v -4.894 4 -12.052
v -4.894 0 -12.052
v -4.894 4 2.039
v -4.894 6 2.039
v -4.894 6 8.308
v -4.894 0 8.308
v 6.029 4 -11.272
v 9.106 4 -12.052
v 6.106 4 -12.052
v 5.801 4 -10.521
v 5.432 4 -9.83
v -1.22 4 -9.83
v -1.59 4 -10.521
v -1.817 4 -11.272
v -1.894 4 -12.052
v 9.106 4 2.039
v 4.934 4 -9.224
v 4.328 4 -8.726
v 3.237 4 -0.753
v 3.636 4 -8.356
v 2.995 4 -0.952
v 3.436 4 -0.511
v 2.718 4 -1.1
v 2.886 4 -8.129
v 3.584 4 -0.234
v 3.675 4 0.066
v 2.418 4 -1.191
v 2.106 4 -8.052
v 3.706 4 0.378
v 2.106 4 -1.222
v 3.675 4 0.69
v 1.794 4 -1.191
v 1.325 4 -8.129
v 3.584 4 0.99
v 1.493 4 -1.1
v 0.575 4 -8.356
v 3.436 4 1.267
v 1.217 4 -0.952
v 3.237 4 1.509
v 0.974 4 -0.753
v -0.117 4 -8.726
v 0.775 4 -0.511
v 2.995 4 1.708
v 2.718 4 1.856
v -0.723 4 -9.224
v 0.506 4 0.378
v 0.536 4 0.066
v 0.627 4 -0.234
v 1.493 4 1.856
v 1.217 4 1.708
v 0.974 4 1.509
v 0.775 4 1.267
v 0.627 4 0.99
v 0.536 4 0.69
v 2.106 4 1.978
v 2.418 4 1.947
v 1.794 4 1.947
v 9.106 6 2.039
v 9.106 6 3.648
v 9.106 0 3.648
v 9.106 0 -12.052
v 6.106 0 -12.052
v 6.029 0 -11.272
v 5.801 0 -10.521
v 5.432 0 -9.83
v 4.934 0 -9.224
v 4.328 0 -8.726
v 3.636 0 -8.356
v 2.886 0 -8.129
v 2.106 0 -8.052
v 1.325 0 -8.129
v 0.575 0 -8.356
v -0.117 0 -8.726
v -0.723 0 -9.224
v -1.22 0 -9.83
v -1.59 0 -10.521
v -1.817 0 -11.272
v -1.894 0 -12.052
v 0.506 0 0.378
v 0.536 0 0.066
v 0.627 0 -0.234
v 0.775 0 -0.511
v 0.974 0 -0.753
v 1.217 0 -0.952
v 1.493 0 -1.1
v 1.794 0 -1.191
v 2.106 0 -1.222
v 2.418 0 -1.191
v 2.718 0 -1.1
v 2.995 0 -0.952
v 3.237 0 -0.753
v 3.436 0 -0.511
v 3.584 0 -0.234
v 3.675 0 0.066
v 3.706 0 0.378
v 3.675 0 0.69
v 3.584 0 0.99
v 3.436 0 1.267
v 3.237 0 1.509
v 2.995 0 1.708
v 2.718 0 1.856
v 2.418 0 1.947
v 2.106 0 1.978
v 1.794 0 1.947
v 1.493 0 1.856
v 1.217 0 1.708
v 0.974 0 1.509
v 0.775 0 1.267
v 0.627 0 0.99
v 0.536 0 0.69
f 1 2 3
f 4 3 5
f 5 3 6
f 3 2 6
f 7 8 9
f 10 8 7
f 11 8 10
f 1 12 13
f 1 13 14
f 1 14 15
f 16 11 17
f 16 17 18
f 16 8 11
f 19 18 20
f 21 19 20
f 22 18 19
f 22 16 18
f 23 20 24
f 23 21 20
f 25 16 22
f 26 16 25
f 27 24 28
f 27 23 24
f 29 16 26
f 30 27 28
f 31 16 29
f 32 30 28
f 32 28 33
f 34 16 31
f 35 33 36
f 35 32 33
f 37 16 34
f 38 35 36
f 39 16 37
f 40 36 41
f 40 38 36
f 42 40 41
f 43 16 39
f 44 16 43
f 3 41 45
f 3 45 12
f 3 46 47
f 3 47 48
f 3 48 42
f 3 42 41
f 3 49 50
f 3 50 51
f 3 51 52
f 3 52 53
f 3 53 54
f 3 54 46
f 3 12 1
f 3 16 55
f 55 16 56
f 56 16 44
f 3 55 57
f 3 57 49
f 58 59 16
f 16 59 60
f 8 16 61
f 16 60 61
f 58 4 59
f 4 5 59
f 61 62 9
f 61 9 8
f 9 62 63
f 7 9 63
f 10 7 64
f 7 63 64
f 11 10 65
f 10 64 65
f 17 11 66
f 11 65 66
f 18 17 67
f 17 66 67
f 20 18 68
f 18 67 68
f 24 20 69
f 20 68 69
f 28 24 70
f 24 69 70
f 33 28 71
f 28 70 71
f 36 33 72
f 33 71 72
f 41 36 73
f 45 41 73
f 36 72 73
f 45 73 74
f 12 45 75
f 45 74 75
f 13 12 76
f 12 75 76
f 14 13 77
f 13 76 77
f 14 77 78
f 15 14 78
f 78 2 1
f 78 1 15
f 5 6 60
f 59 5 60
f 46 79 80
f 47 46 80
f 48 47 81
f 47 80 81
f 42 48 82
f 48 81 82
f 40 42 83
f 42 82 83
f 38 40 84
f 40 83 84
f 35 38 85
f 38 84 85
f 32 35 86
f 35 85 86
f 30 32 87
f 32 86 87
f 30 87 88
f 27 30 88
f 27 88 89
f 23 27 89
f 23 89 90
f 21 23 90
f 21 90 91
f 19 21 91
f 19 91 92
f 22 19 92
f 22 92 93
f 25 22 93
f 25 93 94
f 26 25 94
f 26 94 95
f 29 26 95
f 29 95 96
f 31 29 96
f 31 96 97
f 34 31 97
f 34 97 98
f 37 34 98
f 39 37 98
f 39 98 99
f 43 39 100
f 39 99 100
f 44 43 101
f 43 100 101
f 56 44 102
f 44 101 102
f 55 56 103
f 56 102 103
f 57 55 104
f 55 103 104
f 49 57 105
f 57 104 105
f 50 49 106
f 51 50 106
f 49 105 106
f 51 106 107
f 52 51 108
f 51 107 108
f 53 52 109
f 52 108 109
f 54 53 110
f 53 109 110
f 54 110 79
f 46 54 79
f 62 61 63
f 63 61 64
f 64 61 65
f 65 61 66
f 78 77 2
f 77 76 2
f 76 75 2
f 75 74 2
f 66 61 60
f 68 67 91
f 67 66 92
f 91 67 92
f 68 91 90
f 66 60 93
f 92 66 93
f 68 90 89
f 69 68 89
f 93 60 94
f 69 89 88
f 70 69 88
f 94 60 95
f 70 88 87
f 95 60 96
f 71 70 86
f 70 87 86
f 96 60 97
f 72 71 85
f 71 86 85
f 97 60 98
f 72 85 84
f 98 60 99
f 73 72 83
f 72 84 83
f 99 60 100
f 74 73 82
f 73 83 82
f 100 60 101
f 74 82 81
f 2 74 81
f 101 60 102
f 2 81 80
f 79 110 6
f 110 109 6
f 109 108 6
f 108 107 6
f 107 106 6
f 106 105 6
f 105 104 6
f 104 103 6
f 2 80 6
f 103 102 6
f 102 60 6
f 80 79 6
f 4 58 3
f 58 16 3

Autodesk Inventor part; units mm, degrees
ref_plane "YZ Plane" through (0, 0, 0) normal (1, 0, 0) x (0, 1, 0)
ref_plane "XZ Plane" through (0, 0, 0) normal (0, 1, 0) x (-1, 0, 0)
ref_plane "XY Plane" through (0, 0, 0) normal (0, 0, 1) x (1, 0, 0)
sketch "Sketch1" plane through (0, 0, 0) normal (0, 1, 0) x (-1, 0, 0)
  line L0 (-9.1057, 3.648) -> (-9.1057, -9.552)
  line L1 (4.8943, -9.552) -> (4.8943, 8.308)
  line L2 (4.8943, 8.308) -> (-9.1057, 3.648)
  line L3 (-2.1057, 5.978) -> (-2.1057, 1.978)
  circle A0 centre (-2.1057, 0.378) radius 1.6
  line L4 (4.8943, -9.552) -> (4.8943, -12.052)
  line L5 (-9.1057, -9.552) -> (-9.1057, -12.052)
  line L6 (4.8943, -12.052) -> (-9.1057, -12.052)
  circle A1 centre (-2.1057, -12.052) radius 4
  line L7 (-2.1057, -1.222) -> (-2.1057, -8.052)
  line L8 (4.8943, 1.978) -> (-2.1057, 1.978)
  line L9 (-9.1057, 1.978) -> (-2.1057, 1.978)
  point P0 (0, 0)
  point P1 (1.8943, -12.052)
  point P2 (-6.1057, -12.052)
  dimension "d8" = 3.2
  dimension "d19" = 8
  dimension "d5" = 13.2
  dimension "d6" = 4
  dimension "d10" = 17.86
  dimension "d13" = 14
  dimension "d16" = 2.5
extrude "Extrusion2" add sketch "Sketch1" along normal blind 4 contours L2 L3 L9 L0 | L9 A0 L7 A1 L6 L5 L0 | L2 L1 L8 L3 | L8 L1 L4 L6 A1 L7 A0
sketch "Sketch2" plane through (0, 0, 0) normal (0, -1, 0) x (1, 0, 0)
  line L0 (9.1057, 3.648) -> (9.1057, -12.052) projected
  line L1 (9.1057, 2.0387) -> (-4.8943, 2.0387)
  line L2 (-4.8943, -12.052) -> (-4.8943, 8.308) projected
  line L3 (-4.8943, 2.0387) -> (-4.8943, 8.308)
  line L4 (-4.8943, 8.308) -> (9.1057, 3.648) projected
  line L5 (-4.8943, 8.308) -> (9.1057, 3.648)
  line L6 (9.1057, 3.648) -> (9.1057, 2.0387)
  point P0 (0, 0)
extrude "Extrusion3" add sketch "Sketch2" against normal blind 6
properties part number "plungerholdermod2"
